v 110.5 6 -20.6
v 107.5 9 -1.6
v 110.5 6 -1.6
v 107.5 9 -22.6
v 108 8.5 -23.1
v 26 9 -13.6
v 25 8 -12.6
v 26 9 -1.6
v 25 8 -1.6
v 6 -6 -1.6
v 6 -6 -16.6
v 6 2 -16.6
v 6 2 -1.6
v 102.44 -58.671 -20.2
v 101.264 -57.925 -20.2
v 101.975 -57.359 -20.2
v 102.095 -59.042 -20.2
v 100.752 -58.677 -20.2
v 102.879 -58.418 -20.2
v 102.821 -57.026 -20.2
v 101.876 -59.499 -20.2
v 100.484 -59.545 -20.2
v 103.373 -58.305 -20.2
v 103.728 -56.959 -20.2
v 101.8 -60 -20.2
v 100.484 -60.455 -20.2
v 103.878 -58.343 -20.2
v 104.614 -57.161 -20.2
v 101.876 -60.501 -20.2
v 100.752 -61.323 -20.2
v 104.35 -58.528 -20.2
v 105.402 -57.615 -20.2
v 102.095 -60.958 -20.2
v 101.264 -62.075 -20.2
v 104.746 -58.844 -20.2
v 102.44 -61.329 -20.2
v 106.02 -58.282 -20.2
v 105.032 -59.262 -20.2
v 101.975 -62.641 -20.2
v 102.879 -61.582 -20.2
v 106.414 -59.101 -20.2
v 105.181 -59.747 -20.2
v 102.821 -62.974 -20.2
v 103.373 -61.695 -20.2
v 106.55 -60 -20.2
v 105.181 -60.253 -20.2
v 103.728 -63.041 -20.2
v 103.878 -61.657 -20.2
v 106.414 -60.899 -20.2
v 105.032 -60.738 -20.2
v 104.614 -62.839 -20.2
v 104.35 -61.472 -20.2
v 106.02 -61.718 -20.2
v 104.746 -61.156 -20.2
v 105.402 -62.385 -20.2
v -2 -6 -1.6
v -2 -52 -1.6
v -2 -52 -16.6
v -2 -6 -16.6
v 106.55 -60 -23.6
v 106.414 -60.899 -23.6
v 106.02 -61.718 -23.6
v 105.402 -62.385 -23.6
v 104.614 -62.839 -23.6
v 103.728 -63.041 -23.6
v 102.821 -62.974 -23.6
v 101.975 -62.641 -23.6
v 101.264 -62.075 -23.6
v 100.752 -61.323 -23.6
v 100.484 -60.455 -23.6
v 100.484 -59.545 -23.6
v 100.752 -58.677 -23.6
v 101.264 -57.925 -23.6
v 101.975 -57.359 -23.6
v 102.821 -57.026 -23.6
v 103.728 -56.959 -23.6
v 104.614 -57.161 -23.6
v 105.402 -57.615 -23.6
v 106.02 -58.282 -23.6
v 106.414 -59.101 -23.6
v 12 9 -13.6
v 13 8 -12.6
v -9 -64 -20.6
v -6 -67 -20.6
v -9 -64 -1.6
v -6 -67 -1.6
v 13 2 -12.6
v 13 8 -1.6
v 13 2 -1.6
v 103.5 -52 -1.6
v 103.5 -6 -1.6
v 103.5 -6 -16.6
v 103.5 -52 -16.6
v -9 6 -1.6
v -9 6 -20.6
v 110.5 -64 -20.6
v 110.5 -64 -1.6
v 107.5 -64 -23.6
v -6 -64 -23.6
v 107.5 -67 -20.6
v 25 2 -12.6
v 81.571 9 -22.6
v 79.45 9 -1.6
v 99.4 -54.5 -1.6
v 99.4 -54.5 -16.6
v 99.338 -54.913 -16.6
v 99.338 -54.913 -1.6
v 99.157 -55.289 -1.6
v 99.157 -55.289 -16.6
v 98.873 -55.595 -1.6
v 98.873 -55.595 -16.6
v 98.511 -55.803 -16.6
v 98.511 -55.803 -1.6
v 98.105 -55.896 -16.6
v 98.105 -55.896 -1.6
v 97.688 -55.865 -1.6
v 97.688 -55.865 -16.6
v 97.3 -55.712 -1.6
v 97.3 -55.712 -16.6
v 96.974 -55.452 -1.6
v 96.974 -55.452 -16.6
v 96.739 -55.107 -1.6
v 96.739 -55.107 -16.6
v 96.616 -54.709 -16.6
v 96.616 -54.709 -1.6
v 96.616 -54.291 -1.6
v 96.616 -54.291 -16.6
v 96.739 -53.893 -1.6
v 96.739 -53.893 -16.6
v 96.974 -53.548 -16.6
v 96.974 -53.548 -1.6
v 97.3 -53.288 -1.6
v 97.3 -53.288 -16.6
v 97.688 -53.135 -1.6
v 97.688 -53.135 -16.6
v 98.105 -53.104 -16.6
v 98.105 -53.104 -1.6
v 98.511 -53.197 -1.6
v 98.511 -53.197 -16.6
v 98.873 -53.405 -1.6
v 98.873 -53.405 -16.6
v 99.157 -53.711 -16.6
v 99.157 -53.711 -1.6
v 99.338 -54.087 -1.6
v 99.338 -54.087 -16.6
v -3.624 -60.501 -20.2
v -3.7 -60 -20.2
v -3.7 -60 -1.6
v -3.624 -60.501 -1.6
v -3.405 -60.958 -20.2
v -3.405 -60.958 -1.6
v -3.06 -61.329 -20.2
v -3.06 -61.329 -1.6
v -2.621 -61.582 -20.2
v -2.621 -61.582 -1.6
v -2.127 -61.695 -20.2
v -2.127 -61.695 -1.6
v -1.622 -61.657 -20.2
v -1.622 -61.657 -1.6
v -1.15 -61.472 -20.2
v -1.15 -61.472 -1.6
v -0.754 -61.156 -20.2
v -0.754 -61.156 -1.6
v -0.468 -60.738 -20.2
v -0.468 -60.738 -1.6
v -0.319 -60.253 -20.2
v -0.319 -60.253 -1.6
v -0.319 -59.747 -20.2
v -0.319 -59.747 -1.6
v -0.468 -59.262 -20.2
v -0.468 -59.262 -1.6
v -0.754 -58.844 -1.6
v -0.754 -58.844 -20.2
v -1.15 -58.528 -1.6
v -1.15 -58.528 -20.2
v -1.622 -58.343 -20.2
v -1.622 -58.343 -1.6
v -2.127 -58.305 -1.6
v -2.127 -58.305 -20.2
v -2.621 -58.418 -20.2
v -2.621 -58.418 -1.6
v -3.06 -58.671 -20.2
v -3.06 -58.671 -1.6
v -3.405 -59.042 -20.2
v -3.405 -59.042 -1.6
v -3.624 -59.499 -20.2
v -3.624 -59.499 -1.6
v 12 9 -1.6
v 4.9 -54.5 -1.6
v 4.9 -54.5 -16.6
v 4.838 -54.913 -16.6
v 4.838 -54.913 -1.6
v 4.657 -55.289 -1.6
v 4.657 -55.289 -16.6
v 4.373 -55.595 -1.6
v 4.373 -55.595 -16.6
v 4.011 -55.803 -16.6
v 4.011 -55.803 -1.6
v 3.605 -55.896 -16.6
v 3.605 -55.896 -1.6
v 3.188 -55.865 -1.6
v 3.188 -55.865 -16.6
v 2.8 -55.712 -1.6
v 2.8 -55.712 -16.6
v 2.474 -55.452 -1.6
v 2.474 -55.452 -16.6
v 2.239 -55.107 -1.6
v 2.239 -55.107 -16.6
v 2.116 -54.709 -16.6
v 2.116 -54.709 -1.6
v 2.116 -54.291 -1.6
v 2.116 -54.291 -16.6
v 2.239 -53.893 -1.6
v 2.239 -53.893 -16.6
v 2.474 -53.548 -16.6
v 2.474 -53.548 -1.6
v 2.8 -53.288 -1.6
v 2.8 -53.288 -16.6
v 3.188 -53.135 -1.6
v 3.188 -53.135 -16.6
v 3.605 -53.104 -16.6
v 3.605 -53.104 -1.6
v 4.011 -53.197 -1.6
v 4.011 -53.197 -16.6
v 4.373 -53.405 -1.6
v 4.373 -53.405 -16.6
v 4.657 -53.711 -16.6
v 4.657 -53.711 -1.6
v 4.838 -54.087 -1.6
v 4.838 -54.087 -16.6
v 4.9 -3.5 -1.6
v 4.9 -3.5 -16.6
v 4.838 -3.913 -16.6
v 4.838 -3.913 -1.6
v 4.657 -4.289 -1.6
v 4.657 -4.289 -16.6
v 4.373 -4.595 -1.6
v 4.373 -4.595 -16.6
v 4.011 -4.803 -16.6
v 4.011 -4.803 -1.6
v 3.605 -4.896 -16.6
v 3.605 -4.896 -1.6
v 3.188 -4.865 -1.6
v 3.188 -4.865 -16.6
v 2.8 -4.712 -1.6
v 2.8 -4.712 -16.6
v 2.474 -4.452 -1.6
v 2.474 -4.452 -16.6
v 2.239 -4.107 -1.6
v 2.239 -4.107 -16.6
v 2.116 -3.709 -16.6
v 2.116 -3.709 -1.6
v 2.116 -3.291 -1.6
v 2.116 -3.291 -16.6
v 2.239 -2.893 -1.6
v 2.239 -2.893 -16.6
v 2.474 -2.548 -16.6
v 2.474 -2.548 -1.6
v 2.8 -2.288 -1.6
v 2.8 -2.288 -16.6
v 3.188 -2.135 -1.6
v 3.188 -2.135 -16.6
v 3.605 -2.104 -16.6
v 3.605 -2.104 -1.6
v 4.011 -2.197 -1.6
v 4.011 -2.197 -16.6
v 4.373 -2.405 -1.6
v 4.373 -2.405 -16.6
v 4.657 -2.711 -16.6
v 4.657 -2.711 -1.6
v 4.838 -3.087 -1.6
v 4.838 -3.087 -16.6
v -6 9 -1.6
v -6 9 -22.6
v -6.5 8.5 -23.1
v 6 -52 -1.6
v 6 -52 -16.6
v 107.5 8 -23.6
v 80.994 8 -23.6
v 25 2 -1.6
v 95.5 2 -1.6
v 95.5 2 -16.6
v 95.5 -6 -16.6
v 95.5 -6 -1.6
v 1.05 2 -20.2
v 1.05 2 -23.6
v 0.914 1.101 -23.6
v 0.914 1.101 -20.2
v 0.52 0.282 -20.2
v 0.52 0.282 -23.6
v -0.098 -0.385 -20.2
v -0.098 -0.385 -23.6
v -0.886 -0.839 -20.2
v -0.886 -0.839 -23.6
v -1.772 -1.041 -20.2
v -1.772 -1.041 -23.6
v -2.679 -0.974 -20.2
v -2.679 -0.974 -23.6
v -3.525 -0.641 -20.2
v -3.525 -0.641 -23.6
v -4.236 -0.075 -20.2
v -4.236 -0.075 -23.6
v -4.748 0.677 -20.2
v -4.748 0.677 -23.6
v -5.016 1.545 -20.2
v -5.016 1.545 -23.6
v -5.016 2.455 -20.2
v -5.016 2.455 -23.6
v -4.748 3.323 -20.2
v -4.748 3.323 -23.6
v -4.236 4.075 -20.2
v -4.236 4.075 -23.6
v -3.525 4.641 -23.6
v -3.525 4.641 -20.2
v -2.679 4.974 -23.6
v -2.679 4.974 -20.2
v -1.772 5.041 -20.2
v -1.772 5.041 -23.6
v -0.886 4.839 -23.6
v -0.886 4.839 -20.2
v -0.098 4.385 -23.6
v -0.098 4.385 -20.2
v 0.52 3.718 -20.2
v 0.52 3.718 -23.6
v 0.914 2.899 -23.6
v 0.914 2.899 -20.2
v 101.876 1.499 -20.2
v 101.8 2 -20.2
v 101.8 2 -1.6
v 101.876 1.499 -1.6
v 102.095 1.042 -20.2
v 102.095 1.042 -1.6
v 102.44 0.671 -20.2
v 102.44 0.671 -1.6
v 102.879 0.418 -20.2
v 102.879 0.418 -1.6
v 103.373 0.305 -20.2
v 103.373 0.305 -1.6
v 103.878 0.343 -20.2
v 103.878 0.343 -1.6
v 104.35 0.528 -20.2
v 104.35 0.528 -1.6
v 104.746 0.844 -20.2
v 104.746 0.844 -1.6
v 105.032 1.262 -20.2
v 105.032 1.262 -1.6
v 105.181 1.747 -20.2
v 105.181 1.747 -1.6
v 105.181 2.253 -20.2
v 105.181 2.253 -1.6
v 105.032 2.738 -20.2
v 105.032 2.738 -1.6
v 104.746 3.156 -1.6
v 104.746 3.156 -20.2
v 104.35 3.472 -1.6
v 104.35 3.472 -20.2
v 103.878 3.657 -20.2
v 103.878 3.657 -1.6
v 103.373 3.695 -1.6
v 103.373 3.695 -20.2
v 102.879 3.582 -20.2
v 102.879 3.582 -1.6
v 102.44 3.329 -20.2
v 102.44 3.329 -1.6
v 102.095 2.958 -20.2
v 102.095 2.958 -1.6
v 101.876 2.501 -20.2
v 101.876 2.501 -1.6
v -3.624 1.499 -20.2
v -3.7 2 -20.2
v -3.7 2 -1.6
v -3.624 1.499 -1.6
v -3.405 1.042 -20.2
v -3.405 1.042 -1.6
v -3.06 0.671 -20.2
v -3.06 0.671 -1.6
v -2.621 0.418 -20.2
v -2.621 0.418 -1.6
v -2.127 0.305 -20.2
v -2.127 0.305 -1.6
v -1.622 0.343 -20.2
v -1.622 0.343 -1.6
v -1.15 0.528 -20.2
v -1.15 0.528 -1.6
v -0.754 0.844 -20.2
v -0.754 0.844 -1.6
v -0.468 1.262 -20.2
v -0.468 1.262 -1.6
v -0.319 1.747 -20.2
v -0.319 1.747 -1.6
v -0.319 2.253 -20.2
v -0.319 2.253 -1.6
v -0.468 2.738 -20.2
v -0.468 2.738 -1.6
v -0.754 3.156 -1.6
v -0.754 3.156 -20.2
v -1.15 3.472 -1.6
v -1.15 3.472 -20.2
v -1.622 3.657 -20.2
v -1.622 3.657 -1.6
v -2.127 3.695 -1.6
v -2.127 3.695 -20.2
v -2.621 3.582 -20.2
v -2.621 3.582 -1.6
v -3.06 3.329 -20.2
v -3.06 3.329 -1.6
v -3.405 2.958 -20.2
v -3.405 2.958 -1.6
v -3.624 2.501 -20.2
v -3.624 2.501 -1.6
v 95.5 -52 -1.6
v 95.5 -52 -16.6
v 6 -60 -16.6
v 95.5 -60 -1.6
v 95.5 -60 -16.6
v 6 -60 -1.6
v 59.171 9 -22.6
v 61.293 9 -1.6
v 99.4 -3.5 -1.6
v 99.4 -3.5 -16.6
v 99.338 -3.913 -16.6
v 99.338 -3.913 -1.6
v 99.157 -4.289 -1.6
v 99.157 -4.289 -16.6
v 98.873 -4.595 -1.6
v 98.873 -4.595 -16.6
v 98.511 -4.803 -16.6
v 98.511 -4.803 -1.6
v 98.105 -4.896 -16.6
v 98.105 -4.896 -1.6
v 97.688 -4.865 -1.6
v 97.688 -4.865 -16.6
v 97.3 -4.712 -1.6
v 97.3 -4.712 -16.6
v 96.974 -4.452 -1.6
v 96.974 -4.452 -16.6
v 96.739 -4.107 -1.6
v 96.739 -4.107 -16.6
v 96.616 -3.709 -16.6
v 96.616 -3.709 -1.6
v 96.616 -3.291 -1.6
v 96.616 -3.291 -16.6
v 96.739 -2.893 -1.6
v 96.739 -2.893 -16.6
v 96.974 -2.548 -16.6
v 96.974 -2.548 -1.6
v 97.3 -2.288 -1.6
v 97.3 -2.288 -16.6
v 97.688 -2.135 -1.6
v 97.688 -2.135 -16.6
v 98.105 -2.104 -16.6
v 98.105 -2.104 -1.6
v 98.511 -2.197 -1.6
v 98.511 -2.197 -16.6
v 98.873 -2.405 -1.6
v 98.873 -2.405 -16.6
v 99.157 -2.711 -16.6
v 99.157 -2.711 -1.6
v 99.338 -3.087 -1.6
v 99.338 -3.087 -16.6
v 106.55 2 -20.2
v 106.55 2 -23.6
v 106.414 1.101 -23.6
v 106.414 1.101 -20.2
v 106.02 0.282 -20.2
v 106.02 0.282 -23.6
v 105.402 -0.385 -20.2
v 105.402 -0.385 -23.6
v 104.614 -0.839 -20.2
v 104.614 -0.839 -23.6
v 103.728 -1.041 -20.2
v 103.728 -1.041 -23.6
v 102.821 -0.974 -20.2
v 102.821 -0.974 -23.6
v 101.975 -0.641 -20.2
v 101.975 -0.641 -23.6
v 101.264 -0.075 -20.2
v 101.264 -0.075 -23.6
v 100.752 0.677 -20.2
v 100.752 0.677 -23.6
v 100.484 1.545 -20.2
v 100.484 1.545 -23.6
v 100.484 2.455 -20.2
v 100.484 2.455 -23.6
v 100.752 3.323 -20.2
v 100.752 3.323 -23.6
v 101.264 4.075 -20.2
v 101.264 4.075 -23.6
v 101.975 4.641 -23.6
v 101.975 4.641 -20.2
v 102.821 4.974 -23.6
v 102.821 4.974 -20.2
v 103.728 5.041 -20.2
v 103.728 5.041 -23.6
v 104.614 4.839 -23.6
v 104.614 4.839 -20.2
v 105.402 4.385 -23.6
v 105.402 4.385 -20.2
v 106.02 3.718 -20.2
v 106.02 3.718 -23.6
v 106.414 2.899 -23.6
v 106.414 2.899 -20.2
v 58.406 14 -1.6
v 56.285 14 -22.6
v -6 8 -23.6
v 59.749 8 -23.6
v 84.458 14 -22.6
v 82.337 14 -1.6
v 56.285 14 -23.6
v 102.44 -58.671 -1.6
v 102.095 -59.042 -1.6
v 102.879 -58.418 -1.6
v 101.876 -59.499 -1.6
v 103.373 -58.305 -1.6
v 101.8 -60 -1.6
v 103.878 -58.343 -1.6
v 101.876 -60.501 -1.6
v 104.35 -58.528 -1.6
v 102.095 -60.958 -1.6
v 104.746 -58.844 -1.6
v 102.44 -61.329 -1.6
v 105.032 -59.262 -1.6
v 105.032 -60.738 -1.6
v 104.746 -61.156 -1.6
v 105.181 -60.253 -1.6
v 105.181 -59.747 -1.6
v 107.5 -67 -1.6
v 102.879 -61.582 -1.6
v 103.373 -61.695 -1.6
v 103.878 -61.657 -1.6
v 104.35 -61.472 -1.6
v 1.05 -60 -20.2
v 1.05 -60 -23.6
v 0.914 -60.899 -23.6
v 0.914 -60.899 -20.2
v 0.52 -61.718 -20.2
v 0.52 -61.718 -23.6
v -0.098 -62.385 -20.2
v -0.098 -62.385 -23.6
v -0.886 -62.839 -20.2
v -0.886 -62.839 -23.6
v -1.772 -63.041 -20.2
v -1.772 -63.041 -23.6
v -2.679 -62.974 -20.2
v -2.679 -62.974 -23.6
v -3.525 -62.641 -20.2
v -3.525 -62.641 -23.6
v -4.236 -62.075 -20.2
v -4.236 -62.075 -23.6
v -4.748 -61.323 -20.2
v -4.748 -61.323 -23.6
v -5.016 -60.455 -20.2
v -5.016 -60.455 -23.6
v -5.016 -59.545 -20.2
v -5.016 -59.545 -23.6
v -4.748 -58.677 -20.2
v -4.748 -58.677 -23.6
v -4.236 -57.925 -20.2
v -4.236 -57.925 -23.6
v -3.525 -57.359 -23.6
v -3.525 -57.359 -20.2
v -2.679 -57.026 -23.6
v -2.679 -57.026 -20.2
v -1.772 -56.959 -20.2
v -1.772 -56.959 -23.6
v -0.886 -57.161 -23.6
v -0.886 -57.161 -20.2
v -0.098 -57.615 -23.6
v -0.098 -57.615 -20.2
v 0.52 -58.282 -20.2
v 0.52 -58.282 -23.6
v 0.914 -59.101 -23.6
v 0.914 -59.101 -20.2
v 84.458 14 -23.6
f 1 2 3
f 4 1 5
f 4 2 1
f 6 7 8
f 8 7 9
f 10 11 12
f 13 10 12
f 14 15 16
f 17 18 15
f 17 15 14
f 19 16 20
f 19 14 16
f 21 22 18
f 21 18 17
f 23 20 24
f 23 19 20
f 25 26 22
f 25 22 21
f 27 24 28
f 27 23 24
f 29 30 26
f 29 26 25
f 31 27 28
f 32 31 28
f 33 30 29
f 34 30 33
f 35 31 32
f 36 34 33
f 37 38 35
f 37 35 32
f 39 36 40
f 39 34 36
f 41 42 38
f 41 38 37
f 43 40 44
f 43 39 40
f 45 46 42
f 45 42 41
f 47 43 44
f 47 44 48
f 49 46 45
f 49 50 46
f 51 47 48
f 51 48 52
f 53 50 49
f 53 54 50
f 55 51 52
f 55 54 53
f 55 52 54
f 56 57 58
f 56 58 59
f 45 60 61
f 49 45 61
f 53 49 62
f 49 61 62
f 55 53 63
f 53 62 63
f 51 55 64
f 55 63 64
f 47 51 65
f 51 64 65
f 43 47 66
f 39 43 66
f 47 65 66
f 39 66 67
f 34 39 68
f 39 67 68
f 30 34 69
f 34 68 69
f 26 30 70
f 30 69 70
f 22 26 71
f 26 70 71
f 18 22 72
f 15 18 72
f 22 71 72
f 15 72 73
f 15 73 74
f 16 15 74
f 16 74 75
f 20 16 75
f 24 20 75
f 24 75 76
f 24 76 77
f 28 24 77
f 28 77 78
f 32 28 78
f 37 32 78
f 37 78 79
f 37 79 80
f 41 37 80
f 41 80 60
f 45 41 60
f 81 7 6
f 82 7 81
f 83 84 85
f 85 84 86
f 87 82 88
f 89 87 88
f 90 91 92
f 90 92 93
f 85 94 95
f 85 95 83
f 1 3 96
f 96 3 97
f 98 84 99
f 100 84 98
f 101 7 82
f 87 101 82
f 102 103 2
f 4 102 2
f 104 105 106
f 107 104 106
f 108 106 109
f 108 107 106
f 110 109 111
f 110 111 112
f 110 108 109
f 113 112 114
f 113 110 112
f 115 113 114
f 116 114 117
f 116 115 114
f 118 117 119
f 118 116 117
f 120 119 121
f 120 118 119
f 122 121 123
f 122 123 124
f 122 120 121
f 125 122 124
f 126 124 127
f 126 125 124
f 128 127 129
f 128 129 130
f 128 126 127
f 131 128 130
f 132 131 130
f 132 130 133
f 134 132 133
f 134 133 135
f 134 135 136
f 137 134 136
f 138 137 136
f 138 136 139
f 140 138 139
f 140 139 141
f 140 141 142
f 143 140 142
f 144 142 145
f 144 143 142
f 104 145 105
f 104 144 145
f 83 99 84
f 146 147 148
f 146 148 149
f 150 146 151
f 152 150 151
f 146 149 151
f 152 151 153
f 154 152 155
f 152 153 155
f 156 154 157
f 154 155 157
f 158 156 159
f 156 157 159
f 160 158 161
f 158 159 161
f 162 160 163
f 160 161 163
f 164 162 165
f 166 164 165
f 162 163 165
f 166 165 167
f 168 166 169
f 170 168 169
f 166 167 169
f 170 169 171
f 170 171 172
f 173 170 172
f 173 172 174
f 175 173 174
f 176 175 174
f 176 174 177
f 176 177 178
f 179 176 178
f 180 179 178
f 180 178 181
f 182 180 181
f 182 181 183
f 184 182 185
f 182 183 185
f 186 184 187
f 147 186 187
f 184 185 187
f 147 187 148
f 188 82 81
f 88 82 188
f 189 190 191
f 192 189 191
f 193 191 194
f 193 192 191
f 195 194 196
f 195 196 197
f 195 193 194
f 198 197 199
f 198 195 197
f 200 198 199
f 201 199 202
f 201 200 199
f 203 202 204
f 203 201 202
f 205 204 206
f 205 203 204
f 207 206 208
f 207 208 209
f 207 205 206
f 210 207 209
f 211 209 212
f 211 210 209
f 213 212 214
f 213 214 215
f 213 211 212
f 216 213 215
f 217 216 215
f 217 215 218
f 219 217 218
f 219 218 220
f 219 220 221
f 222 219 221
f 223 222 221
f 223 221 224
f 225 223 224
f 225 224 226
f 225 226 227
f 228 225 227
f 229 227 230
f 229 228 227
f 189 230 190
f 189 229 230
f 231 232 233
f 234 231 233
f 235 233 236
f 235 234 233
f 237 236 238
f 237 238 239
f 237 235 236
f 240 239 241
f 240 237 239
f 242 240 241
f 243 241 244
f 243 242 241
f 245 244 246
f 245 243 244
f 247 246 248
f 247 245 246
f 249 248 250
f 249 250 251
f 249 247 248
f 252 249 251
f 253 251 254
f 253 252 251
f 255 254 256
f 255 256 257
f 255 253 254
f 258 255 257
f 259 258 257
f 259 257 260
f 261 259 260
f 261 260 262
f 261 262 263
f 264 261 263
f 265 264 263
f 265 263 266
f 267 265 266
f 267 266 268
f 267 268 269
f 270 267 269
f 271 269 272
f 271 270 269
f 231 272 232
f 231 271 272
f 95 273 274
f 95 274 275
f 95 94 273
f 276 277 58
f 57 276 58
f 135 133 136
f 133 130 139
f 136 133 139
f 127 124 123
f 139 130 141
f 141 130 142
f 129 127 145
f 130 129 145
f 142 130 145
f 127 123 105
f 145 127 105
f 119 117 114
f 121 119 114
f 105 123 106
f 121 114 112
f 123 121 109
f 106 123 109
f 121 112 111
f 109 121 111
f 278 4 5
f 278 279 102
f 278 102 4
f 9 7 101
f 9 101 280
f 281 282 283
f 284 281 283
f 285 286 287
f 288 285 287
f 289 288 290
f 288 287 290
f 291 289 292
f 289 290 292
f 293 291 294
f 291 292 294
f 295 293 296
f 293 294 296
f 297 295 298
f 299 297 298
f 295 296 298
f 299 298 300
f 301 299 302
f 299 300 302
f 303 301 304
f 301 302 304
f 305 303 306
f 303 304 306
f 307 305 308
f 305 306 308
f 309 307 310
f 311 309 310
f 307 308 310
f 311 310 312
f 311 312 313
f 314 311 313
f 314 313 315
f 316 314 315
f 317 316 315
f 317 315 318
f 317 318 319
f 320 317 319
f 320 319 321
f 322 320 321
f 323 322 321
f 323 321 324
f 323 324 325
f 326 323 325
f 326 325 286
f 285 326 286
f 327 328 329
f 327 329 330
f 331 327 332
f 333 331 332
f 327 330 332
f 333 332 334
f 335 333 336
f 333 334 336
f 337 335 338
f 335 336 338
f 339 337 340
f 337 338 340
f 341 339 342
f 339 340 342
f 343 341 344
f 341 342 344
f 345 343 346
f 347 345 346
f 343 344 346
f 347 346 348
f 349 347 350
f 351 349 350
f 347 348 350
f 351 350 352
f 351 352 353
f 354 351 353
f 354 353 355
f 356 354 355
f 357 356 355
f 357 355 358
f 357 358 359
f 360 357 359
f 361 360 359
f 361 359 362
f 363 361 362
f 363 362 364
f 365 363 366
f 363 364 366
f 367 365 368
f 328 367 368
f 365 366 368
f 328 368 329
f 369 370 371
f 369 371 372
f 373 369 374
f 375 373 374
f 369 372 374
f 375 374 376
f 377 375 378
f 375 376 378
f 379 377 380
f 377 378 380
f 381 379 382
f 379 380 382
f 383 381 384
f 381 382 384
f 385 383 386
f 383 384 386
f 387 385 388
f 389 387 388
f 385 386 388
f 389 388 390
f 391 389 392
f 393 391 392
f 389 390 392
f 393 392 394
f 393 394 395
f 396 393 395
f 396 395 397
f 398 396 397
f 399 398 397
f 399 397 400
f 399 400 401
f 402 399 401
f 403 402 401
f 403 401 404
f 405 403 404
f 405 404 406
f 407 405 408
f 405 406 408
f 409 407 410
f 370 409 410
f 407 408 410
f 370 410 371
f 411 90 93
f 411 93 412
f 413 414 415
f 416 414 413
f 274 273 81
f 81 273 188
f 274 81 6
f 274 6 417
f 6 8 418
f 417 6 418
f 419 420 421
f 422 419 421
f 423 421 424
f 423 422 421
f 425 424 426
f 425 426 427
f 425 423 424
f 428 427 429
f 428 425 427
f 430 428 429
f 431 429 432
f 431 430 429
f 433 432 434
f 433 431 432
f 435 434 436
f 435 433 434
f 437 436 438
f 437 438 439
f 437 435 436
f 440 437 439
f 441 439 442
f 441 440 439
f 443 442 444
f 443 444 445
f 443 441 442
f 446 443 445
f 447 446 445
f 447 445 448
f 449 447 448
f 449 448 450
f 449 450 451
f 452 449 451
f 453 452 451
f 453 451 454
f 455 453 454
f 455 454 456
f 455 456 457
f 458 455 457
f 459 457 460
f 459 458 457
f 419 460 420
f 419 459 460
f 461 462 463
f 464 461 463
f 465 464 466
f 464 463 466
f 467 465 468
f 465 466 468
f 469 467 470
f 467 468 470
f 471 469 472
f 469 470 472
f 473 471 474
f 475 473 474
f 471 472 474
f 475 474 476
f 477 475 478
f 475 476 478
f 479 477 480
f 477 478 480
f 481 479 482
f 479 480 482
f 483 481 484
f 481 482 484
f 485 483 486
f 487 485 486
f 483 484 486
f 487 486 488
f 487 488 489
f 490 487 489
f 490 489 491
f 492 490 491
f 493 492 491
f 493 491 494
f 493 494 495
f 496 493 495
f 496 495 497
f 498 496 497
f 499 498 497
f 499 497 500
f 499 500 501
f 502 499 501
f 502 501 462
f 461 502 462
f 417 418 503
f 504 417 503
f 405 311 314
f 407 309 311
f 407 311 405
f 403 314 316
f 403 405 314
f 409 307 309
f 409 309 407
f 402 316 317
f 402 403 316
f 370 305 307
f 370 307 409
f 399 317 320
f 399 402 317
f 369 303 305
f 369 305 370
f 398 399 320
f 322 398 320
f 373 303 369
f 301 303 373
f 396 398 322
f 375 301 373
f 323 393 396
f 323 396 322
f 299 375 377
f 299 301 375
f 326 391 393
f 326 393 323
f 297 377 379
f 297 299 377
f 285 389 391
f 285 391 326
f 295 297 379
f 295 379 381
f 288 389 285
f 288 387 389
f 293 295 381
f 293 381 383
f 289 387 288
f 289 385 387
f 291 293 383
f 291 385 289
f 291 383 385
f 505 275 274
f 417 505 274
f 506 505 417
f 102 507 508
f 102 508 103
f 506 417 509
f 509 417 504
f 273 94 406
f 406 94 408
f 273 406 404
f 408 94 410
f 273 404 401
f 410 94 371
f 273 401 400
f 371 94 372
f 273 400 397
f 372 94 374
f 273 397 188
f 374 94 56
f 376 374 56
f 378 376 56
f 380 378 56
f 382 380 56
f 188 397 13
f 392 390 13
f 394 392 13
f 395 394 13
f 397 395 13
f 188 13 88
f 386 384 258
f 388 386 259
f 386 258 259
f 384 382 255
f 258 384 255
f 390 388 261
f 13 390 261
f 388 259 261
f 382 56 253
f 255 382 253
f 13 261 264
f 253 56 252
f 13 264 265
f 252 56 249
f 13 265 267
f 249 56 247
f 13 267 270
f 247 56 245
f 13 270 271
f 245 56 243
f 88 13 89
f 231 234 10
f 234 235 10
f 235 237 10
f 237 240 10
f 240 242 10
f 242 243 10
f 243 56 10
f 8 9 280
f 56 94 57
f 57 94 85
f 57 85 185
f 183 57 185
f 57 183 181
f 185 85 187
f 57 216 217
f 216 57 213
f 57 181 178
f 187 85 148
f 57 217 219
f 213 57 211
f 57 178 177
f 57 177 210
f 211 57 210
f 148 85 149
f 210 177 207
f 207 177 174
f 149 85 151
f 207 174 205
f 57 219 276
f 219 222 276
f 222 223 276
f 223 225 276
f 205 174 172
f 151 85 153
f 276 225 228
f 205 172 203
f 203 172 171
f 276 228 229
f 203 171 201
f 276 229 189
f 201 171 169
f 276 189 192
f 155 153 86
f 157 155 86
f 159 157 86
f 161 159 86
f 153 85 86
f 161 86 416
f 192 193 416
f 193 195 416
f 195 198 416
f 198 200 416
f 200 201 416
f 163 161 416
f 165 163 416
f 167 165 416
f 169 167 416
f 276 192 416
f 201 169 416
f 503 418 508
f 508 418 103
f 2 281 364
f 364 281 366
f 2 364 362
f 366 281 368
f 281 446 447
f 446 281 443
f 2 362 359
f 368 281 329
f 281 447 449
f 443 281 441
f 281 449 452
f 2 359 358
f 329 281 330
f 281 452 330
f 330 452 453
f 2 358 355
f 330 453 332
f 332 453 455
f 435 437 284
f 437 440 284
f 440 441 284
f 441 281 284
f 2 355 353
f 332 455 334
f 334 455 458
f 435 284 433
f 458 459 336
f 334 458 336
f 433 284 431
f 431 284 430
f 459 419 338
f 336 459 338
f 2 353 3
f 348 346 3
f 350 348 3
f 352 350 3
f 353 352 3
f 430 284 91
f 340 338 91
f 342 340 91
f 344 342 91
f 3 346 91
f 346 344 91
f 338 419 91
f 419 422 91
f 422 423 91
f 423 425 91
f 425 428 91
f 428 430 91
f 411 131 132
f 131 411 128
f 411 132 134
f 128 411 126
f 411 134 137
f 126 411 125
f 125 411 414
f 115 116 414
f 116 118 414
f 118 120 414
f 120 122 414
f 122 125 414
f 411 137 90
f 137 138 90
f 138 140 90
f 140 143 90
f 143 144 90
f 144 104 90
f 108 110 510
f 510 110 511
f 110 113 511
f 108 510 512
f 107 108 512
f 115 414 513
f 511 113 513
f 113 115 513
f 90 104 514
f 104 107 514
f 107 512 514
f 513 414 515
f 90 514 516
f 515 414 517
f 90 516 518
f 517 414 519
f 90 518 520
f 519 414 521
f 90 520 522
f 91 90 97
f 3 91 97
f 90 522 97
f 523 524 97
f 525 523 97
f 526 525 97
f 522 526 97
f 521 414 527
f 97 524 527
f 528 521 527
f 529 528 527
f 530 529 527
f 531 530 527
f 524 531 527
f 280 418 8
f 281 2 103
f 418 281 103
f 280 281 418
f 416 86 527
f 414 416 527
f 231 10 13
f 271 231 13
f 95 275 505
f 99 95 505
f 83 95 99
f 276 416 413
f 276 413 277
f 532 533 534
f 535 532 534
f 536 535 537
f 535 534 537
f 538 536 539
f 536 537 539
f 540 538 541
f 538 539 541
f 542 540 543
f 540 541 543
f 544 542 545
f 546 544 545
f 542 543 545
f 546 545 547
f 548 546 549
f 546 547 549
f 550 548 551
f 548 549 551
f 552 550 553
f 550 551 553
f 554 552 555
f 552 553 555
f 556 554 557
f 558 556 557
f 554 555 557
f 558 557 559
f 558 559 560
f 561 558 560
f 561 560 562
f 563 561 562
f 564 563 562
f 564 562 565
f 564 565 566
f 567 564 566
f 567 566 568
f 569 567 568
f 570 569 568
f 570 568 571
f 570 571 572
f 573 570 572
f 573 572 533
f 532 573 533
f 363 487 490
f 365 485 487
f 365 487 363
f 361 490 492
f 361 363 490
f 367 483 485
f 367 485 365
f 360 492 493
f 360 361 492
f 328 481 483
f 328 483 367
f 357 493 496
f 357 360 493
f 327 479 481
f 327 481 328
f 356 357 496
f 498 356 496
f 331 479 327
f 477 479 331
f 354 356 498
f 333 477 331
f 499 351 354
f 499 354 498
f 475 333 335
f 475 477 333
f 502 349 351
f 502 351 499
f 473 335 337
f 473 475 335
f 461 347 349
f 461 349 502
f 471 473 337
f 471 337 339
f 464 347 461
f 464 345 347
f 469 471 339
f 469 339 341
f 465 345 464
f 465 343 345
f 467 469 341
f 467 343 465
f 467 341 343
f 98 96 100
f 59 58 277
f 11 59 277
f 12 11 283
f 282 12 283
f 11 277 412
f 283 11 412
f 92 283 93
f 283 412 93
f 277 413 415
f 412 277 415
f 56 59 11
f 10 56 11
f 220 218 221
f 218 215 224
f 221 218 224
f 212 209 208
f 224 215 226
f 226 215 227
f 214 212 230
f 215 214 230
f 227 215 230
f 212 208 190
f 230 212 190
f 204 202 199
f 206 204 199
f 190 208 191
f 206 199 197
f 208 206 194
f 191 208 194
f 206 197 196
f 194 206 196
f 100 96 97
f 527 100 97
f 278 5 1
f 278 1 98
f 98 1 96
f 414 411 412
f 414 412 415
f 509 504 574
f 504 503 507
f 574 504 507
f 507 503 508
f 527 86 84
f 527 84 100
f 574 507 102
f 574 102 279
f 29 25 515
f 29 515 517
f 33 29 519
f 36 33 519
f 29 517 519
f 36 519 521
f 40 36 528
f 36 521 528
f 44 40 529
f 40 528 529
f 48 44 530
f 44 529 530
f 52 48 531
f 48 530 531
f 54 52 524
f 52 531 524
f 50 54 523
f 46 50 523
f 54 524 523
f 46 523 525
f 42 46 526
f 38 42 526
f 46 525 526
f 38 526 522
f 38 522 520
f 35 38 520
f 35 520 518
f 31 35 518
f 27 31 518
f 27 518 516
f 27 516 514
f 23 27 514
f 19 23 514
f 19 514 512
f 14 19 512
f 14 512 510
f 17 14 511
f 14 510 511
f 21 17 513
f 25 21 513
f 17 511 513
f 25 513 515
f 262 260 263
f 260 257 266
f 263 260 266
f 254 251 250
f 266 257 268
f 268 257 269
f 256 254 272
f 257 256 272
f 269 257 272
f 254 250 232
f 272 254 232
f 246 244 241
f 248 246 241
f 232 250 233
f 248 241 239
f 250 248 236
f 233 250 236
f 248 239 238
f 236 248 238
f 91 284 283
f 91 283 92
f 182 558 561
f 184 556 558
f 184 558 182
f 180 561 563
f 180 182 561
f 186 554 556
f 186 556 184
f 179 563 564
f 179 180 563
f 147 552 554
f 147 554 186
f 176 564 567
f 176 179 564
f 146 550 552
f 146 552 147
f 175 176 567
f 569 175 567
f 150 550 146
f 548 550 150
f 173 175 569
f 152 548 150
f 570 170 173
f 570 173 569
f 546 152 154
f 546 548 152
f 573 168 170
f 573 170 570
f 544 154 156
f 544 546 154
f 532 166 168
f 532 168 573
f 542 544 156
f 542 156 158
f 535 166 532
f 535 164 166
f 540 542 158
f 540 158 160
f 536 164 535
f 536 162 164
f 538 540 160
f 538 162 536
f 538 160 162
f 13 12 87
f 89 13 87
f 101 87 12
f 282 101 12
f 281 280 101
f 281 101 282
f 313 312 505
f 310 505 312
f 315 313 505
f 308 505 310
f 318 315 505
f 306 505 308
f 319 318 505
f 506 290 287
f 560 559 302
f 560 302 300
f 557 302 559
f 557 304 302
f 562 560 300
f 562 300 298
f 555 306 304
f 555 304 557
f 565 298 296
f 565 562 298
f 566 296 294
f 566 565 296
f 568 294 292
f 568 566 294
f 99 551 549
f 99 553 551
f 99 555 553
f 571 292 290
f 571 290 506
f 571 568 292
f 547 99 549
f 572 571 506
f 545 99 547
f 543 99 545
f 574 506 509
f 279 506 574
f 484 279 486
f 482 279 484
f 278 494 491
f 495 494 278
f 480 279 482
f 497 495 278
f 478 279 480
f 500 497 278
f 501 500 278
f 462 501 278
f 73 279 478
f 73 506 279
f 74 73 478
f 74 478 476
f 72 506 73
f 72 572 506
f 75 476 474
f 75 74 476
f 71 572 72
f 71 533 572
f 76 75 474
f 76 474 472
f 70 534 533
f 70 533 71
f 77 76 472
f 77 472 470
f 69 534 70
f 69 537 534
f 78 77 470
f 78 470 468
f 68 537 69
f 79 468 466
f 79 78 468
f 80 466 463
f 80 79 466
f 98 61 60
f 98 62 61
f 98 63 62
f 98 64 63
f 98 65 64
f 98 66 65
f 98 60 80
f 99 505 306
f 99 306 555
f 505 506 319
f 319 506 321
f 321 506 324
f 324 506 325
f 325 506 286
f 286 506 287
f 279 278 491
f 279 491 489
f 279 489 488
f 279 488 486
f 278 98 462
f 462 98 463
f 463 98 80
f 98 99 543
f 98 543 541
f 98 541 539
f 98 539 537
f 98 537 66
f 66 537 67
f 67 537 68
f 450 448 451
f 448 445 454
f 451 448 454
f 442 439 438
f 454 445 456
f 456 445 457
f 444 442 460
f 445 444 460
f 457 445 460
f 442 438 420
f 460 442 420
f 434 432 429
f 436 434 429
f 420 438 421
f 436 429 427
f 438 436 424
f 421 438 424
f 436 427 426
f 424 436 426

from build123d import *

# Parameters (mm, degrees)
SKETCH030_W        = 119.5
SKETCH030_H        = 76
SKETCH030_R        = 1.4
PAD009_DEPTH       = 15
SKETCH031_W        = 119.5
SKETCH031_H        = 76
PAD010_DEPTH       = 7
SKETCH032_W        = 12
SKETCH032_H        = 11
POCKET011_DEPTH    = 7
HOLE_D             = 3.4
HOLE_CBORE_D       = 6.1
HOLE_CBORE_DEPTH   = 3.4
PAD013_DEPTH       = 22
CHAMFER001_1_ANGLE = 5
CHAMFER001_1_SIZE  = 21
CHAMFER001_2_ANGLE = 5
CHAMFER001_2_SIZE  = 21
CHAMFER003_SIZE    = 3
CHAMFER004_SIZE    = 1
CHAMFER005_SIZE    = 1


with BuildPart() as part:
    # Sketch030 (on Face1 of Binder008) → Pad009 (new body)
    with BuildSketch(Plane(origin=(0, 0, -1.6), x_dir=(1, 0, 0), z_dir=(0, 0, -1))):
        with Locations((50.75, 29)):
            Rectangle(SKETCH030_W, SKETCH030_H)
        with Locations((3.5, 54.5)):
            Circle(SKETCH030_R, mode=Mode.SUBTRACT)
        with Locations((98, 54.5)):
            Circle(SKETCH030_R, mode=Mode.SUBTRACT)
        with Locations((98, 3.5)):
            Circle(SKETCH030_R, mode=Mode.SUBTRACT)
        with Locations((3.5, 3.5)):
            Circle(SKETCH030_R, mode=Mode.SUBTRACT)
        Polygon((-2, 52), (-2, 6), (6, 6), (6, -2), (95.5, -2), (95.5, 6), (103.5, 6), (103.5, 52), (95.5, 52), (95.5, 60), (6, 60), (6, 52), align=None, mode=Mode.SUBTRACT)
    extrude(amount=PAD009_DEPTH)

    # Sketch031 (on Face22 of Pad009) → Pad010 (join)
    with BuildSketch(Plane(origin=(0, 0, -16.6), x_dir=(1, 0, 0), z_dir=(0, 0, -1))):
        with Locations((50.75, 29)):
            Rectangle(SKETCH031_W, SKETCH031_H)
    extrude(amount=PAD010_DEPTH)

    # Sketch032 (on Face26 of Pad010) → Pocket011 (cut)
    with BuildSketch(Plane(origin=(0, 9, 0), x_dir=(-1, 0, 0), z_dir=(0, 1, 0))):
        with Locations((-19, -7.1)):
            Rectangle(SKETCH032_W, SKETCH032_H)
    extrude(amount=-POCKET011_DEPTH, mode=Mode.SUBTRACT)

    # Hole (through all)
    with Locations(Plane(origin=(0, 0, -23.6), x_dir=(1, 0, 0), z_dir=(0, 0, -1))):
        with Locations((-2, 60), (103.5, 60), (103.5, -2), (-2, -2)):
            CounterBoreHole(HOLE_D / 2, HOLE_CBORE_D / 2, HOLE_CBORE_DEPTH)

    # Sketch038 (on Face1 of Hole) → Pad013 (join)
    with BuildSketch(Plane.XY.offset(-1.6)):
        Polygon((81.571463, 9), (59.171468, 9), (56.284717, 14), (84.458214, 14), align=None)
    extrude(amount=-PAD013_DEPTH)

    # Chamfer001 1
    chamfer001_1_edges = [part.edges().sort_by_distance(p)[0] for p in [
        (83.014838, 11.5, -1.6),
    ]]
    chamfer001_1_side = part.faces().sort_by_distance((83.014838, 11.5, -12.6))[0]
    chamfer(chamfer001_1_edges, length=CHAMFER001_1_SIZE, angle=CHAMFER001_1_ANGLE, reference=chamfer001_1_side)

    # Chamfer001 2
    chamfer001_2_edges = [part.edges().sort_by_distance(p)[0] for p in [
        (57.728092, 11.5, -1.6),
    ]]
    chamfer001_2_side = part.faces().sort_by_distance((57.728092, 11.5, -12.6))[0]
    chamfer(chamfer001_2_edges, length=CHAMFER001_2_SIZE, angle=CHAMFER001_2_ANGLE, reference=chamfer001_2_side)

    # Chamfer003
    chamfer003_edges = [part.edges().sort_by_distance(p)[0] for p in [
        (110.5, 9, -12.6),
        (110.5, -29, -23.6),
        (110.5, -67, -12.6),
        (50.75, -67, -23.6),
        (-9, 9, -12.6),
        (-9, -29, -23.6),
        (-9, -67, -12.6),
    ]]
    chamfer(chamfer003_edges, length=CHAMFER003_SIZE)

    # Chamfer004
    chamfer004_edges = [part.edges().sort_by_distance(p)[0] for p in [
        (26.585734, 9, -23.6),
        (94.535731, 9, -23.6),
    ]]
    chamfer(chamfer004_edges, length=CHAMFER004_SIZE)

    # Chamfer005
    chamfer005_edges = [part.edges().sort_by_distance(p)[0] for p in [
        (13, 9, -7.1),
        (19, 9, -12.6),
        (25, 9, -7.1),
    ]]
    chamfer(chamfer005_edges, length=CHAMFER005_SIZE)


solid = part.part
